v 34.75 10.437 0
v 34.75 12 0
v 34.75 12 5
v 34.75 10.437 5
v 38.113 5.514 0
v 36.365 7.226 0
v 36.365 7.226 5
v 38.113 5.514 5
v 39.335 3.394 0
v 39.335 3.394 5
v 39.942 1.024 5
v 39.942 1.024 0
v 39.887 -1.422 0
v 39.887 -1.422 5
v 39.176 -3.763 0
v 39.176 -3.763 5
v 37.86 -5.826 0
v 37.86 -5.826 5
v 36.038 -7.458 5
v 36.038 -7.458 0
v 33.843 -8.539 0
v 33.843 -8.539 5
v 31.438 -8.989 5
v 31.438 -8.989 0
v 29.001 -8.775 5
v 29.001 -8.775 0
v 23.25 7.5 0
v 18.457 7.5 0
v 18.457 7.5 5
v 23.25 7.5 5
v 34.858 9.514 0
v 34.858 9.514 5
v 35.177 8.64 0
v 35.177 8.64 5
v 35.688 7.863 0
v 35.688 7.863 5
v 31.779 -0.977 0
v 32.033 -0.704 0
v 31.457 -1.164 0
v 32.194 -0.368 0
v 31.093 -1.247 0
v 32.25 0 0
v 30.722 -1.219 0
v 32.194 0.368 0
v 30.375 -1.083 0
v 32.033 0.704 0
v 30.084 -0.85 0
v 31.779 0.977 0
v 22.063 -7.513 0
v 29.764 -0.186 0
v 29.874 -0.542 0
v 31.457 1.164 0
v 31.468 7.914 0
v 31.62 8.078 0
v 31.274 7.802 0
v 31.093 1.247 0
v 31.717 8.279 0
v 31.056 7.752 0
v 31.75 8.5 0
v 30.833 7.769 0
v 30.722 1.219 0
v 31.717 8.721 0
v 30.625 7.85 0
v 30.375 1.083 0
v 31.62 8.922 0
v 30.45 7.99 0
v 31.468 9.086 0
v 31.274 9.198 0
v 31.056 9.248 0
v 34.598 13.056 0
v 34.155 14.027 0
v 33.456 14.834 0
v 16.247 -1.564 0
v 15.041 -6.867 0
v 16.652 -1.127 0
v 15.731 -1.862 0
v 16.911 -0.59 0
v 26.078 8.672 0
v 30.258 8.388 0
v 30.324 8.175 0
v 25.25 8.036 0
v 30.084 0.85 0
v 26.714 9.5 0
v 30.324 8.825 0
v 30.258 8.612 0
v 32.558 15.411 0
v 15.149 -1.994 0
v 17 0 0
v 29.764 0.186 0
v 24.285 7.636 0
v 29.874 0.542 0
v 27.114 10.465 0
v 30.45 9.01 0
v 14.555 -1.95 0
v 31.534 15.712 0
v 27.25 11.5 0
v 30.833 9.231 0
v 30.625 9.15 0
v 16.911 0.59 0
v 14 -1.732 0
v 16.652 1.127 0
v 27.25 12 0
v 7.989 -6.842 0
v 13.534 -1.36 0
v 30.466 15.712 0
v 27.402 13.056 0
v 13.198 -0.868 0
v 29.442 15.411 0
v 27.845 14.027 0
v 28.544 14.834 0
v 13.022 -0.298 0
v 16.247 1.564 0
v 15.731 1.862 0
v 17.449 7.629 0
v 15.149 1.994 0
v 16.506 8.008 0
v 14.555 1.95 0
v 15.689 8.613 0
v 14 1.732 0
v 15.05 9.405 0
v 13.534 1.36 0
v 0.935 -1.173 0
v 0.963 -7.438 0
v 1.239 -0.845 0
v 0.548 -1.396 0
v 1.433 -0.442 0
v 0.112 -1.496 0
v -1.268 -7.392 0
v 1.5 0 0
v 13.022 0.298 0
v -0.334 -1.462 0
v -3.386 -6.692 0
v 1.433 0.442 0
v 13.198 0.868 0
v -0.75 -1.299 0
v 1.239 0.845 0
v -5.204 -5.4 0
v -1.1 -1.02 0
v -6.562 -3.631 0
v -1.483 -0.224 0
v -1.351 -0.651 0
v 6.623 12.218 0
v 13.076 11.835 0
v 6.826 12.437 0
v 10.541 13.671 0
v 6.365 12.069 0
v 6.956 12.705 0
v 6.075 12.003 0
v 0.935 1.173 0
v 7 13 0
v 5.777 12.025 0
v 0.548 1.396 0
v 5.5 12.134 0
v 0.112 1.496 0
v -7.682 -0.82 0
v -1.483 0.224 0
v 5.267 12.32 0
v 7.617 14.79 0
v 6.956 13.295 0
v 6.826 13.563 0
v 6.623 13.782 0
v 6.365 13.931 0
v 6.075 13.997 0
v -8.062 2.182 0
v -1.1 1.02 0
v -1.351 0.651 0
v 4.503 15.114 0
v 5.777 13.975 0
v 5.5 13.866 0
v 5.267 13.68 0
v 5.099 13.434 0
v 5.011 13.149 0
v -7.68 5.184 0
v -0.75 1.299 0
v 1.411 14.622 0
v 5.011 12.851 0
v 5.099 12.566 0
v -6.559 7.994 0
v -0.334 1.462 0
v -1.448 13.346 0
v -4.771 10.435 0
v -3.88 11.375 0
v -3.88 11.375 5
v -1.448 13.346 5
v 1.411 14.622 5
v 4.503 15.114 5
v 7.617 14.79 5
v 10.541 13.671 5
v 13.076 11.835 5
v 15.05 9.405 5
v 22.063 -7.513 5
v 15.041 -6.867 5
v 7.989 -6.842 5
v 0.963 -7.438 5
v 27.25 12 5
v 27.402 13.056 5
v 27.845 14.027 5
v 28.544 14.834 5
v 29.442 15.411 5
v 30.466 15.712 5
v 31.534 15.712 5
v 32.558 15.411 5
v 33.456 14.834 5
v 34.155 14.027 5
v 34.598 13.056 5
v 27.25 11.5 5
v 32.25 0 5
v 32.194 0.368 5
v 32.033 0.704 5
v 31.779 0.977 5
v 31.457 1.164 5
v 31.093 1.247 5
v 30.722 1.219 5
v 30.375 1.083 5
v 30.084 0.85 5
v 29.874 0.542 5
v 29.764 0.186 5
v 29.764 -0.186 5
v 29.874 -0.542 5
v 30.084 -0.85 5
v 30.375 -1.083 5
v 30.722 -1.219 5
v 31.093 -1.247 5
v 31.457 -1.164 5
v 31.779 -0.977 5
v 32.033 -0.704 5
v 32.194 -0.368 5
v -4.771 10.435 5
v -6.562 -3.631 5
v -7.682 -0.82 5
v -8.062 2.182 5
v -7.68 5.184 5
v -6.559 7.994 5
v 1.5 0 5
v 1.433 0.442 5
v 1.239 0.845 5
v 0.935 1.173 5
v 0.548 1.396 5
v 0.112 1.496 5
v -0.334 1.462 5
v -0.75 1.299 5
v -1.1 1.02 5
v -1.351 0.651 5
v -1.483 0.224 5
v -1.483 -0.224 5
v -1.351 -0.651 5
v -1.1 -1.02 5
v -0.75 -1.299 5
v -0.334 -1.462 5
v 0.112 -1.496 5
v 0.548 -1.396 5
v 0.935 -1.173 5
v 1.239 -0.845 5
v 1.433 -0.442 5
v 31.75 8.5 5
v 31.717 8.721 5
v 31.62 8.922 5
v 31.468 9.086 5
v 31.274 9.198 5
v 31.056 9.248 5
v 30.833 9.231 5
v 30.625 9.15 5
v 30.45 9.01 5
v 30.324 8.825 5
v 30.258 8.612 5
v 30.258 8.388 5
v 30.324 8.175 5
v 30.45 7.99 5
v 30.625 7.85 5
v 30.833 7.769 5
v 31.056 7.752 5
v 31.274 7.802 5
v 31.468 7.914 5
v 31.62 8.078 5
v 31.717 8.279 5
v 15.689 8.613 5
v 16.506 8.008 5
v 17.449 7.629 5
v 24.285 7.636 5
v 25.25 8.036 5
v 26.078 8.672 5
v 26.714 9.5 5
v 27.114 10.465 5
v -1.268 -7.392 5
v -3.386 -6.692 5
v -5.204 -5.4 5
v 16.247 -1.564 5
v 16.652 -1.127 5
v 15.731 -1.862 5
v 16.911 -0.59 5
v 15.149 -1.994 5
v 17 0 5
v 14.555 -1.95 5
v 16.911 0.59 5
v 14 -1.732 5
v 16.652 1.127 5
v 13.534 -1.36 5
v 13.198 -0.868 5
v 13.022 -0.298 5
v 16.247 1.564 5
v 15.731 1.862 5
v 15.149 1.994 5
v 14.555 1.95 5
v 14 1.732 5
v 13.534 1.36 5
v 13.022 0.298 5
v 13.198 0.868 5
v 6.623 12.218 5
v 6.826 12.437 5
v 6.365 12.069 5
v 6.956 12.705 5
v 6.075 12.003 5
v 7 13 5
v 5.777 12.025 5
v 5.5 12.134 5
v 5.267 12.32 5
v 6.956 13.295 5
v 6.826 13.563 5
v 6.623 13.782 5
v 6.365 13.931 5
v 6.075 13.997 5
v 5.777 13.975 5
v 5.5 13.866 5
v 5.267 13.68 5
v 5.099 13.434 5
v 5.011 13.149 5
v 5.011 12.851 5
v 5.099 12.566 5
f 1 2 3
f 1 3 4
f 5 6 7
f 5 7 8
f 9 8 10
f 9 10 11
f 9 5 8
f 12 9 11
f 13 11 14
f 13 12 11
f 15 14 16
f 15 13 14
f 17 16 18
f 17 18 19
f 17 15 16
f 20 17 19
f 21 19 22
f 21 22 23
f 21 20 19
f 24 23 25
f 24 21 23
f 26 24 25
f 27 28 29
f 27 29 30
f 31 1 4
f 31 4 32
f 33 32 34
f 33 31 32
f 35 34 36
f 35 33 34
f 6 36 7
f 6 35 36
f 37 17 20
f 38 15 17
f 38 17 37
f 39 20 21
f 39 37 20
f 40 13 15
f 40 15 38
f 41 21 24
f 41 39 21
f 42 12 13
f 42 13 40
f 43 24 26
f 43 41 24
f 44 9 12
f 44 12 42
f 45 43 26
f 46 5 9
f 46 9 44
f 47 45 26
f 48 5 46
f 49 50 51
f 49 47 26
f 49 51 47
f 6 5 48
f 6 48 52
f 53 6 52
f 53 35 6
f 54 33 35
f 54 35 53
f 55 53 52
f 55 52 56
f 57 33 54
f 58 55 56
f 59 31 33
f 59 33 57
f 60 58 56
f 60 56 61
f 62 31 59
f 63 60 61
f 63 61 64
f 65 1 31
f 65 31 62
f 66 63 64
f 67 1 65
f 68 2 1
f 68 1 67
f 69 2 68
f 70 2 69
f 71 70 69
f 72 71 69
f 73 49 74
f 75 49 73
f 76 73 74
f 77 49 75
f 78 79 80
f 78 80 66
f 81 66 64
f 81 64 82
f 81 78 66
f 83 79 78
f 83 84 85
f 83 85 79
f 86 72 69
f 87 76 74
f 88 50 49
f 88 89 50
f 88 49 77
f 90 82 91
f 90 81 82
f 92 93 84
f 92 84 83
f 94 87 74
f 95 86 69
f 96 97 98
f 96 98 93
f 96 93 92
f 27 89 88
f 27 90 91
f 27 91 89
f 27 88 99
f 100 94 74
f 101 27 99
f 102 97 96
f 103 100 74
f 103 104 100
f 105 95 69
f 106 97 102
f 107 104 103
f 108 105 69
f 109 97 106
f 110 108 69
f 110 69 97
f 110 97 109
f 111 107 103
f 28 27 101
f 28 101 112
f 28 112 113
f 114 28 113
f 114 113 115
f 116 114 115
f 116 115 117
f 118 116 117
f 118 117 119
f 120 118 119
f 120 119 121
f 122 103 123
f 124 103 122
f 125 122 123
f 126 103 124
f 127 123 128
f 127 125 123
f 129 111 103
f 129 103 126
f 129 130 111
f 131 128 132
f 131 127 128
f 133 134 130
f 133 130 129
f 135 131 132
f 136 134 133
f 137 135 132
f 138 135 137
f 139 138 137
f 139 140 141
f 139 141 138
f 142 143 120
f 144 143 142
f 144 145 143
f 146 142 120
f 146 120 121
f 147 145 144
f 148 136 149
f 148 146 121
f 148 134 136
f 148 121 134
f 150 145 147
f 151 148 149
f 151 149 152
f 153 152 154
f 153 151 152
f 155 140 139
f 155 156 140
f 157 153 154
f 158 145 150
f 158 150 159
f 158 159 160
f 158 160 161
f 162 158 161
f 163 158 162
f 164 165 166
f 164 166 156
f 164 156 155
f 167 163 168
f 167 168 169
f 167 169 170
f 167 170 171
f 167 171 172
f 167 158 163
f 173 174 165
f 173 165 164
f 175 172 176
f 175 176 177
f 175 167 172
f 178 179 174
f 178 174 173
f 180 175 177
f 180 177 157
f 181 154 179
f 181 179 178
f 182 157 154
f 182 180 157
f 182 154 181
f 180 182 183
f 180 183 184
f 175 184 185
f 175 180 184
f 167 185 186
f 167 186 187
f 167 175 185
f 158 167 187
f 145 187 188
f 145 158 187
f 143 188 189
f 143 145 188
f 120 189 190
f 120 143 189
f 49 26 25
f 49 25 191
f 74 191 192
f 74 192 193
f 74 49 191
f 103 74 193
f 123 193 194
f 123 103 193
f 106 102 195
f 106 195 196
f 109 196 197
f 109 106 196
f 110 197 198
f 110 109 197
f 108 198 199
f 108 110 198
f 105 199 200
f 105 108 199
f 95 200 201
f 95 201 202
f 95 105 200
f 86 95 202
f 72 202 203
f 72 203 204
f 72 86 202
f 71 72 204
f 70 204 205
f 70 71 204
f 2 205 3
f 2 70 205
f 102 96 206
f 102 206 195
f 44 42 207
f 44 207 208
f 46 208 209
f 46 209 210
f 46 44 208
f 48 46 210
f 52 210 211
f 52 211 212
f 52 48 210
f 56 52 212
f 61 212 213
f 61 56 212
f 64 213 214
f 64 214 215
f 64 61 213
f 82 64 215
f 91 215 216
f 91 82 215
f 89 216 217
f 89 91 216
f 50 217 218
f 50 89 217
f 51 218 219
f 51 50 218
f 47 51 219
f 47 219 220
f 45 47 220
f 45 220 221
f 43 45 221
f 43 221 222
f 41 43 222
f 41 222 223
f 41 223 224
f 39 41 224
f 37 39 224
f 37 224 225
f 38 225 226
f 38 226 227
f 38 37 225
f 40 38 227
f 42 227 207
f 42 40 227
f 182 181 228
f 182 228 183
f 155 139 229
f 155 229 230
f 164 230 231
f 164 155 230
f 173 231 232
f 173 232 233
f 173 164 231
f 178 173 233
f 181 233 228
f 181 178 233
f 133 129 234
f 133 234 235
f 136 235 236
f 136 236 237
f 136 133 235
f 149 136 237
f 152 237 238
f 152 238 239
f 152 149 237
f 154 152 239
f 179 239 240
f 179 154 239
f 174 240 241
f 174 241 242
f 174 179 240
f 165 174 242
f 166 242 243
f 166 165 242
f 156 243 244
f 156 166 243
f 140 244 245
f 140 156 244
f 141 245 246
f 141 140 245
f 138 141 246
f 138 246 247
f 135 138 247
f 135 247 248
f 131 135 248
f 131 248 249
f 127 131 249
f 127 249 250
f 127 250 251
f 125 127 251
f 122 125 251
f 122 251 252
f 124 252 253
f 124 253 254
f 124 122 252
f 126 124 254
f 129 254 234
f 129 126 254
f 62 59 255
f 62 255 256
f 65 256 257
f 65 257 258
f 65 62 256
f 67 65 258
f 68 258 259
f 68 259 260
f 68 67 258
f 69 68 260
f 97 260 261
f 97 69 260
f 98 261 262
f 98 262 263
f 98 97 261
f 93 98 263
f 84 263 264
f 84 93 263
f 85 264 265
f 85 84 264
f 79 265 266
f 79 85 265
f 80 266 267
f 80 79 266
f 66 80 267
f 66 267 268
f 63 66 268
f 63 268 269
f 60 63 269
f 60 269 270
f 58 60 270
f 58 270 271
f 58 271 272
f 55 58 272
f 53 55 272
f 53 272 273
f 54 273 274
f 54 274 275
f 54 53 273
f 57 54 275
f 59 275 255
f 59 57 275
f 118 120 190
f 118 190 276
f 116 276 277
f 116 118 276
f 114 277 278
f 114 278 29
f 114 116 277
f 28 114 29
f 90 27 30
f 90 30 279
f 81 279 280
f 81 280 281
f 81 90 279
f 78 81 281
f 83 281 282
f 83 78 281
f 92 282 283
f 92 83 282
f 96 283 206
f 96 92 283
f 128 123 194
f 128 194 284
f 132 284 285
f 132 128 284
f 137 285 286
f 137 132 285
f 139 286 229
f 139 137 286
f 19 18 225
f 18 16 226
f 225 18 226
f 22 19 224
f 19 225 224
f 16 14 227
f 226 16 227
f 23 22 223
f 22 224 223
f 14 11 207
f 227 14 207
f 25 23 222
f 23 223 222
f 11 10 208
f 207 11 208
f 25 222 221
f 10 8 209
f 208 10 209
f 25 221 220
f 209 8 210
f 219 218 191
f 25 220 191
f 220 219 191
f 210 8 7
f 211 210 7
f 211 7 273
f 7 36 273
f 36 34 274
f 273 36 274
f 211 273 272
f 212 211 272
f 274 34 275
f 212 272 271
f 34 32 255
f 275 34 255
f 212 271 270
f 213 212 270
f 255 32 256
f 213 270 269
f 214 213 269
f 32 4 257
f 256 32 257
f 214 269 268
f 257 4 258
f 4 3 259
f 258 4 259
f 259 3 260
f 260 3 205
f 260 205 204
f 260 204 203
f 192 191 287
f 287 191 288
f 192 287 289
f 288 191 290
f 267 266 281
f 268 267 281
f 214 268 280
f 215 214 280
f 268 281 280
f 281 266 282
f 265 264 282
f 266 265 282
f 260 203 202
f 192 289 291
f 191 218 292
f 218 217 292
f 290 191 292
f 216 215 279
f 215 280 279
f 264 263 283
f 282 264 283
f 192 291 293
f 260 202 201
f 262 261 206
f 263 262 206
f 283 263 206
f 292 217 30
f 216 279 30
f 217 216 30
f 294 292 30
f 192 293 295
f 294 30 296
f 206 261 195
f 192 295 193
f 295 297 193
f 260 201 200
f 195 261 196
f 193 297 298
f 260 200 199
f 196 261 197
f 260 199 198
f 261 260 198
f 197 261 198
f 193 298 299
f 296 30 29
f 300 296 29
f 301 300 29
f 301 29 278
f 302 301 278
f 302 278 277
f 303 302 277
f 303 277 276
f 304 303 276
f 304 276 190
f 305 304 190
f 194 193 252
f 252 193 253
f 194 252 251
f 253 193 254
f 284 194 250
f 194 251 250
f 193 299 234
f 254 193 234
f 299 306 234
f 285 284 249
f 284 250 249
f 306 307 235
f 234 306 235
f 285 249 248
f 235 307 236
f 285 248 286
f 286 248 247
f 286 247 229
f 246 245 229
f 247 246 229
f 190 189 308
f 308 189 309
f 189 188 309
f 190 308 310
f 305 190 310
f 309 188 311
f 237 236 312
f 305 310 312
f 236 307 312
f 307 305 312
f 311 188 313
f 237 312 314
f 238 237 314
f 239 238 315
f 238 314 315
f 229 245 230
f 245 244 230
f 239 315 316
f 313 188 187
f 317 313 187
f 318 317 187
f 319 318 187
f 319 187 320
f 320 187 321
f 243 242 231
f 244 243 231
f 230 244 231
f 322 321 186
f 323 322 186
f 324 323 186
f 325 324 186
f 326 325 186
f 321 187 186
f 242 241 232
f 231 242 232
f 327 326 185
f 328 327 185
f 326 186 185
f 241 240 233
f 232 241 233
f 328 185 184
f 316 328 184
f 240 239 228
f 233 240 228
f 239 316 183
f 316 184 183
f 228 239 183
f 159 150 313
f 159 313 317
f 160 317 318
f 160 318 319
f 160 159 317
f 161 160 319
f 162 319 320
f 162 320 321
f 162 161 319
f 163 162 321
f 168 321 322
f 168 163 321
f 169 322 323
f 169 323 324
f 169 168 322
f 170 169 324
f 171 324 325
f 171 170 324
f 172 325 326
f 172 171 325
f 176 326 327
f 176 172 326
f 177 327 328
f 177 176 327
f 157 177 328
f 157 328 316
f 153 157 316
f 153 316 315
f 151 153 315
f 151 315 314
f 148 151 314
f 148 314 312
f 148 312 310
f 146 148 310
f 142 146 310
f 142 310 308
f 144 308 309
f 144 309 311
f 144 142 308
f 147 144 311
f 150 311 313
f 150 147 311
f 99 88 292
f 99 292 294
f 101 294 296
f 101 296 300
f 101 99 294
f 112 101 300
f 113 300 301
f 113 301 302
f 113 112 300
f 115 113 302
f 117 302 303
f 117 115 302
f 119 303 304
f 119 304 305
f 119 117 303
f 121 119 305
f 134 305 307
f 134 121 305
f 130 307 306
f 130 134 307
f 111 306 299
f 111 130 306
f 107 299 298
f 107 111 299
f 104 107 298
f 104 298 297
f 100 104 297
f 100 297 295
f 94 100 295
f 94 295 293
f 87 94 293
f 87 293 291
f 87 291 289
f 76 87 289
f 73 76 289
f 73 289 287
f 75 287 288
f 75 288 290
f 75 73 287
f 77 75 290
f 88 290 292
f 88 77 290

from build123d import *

# Parameters (mm, degrees)
SKETCH1_R           = 1.5
SKETCH1_R_2         = 1.25
SKETCH1_R_3         = 2
SKETCH1_R_4         = 1
SKETCH1_R_5         = 0.75
BOSS_EXTRUDE1_DEPTH = 5


with BuildPart() as part:
    # Sketch1 → Boss-Extrude1 (new body)
    with BuildSketch(Plane.XY):
        with BuildLine():
            Line((18.457499004, 7.5), (23.25, 7.5))
            ThreePointArc((23.25, 7.5), (26.078427125, 8.671572875), (27.25, 11.5))
            Line((27.25, 11.5), (27.25, 12))
            ThreePointArc((27.25, 12), (31, 15.75), (34.75, 12))
            Line((34.75, 12), (34.75, 10.437312873))
            ThreePointArc((34.75, 10.437312873), (35.176593954, 8.639878804), (36.365384615, 7.225831989))
            ThreePointArc((36.365384615, 7.225831989), (39.175605476, -3.762907798), (29.000770207, -8.775139898))
            ThreePointArc((29.000770207, -8.775139898), (15.040769607, -6.867204956), (0.962557604, -7.437975723))
            ThreePointArc((0.962557604, -7.437975723), (-3.385742672, -6.692290083), (-6.5625, -3.630921887))
            ThreePointArc((-6.5625, -3.630921887), (-7.966305911, 3.694931991), (-4.770712178, 10.434886499))
            Line((-4.770712178, 10.434886499), (-3.879663294, 11.374703534))
            ThreePointArc((-3.879663294, 11.374703534), (6.070726491, 15.053905129), (15.050261475, 9.404592542))
            ThreePointArc((15.050261475, 9.404592542), (16.505785633, 8.008465249), (18.457499004, 7.5))
        make_face()
        Circle(SKETCH1_R, mode=Mode.SUBTRACT)
        with Locations((31, 0)):
            Circle(SKETCH1_R_2, mode=Mode.SUBTRACT)
        with Locations((15, 0)):
            Circle(SKETCH1_R_3, mode=Mode.SUBTRACT)
        with Locations((6, 13)):
            Circle(SKETCH1_R_4, mode=Mode.SUBTRACT)
        with Locations((31, 8.5)):
            Circle(SKETCH1_R_5, mode=Mode.SUBTRACT)
    extrude(amount=BOSS_EXTRUDE1_DEPTH)


solid = part.part
